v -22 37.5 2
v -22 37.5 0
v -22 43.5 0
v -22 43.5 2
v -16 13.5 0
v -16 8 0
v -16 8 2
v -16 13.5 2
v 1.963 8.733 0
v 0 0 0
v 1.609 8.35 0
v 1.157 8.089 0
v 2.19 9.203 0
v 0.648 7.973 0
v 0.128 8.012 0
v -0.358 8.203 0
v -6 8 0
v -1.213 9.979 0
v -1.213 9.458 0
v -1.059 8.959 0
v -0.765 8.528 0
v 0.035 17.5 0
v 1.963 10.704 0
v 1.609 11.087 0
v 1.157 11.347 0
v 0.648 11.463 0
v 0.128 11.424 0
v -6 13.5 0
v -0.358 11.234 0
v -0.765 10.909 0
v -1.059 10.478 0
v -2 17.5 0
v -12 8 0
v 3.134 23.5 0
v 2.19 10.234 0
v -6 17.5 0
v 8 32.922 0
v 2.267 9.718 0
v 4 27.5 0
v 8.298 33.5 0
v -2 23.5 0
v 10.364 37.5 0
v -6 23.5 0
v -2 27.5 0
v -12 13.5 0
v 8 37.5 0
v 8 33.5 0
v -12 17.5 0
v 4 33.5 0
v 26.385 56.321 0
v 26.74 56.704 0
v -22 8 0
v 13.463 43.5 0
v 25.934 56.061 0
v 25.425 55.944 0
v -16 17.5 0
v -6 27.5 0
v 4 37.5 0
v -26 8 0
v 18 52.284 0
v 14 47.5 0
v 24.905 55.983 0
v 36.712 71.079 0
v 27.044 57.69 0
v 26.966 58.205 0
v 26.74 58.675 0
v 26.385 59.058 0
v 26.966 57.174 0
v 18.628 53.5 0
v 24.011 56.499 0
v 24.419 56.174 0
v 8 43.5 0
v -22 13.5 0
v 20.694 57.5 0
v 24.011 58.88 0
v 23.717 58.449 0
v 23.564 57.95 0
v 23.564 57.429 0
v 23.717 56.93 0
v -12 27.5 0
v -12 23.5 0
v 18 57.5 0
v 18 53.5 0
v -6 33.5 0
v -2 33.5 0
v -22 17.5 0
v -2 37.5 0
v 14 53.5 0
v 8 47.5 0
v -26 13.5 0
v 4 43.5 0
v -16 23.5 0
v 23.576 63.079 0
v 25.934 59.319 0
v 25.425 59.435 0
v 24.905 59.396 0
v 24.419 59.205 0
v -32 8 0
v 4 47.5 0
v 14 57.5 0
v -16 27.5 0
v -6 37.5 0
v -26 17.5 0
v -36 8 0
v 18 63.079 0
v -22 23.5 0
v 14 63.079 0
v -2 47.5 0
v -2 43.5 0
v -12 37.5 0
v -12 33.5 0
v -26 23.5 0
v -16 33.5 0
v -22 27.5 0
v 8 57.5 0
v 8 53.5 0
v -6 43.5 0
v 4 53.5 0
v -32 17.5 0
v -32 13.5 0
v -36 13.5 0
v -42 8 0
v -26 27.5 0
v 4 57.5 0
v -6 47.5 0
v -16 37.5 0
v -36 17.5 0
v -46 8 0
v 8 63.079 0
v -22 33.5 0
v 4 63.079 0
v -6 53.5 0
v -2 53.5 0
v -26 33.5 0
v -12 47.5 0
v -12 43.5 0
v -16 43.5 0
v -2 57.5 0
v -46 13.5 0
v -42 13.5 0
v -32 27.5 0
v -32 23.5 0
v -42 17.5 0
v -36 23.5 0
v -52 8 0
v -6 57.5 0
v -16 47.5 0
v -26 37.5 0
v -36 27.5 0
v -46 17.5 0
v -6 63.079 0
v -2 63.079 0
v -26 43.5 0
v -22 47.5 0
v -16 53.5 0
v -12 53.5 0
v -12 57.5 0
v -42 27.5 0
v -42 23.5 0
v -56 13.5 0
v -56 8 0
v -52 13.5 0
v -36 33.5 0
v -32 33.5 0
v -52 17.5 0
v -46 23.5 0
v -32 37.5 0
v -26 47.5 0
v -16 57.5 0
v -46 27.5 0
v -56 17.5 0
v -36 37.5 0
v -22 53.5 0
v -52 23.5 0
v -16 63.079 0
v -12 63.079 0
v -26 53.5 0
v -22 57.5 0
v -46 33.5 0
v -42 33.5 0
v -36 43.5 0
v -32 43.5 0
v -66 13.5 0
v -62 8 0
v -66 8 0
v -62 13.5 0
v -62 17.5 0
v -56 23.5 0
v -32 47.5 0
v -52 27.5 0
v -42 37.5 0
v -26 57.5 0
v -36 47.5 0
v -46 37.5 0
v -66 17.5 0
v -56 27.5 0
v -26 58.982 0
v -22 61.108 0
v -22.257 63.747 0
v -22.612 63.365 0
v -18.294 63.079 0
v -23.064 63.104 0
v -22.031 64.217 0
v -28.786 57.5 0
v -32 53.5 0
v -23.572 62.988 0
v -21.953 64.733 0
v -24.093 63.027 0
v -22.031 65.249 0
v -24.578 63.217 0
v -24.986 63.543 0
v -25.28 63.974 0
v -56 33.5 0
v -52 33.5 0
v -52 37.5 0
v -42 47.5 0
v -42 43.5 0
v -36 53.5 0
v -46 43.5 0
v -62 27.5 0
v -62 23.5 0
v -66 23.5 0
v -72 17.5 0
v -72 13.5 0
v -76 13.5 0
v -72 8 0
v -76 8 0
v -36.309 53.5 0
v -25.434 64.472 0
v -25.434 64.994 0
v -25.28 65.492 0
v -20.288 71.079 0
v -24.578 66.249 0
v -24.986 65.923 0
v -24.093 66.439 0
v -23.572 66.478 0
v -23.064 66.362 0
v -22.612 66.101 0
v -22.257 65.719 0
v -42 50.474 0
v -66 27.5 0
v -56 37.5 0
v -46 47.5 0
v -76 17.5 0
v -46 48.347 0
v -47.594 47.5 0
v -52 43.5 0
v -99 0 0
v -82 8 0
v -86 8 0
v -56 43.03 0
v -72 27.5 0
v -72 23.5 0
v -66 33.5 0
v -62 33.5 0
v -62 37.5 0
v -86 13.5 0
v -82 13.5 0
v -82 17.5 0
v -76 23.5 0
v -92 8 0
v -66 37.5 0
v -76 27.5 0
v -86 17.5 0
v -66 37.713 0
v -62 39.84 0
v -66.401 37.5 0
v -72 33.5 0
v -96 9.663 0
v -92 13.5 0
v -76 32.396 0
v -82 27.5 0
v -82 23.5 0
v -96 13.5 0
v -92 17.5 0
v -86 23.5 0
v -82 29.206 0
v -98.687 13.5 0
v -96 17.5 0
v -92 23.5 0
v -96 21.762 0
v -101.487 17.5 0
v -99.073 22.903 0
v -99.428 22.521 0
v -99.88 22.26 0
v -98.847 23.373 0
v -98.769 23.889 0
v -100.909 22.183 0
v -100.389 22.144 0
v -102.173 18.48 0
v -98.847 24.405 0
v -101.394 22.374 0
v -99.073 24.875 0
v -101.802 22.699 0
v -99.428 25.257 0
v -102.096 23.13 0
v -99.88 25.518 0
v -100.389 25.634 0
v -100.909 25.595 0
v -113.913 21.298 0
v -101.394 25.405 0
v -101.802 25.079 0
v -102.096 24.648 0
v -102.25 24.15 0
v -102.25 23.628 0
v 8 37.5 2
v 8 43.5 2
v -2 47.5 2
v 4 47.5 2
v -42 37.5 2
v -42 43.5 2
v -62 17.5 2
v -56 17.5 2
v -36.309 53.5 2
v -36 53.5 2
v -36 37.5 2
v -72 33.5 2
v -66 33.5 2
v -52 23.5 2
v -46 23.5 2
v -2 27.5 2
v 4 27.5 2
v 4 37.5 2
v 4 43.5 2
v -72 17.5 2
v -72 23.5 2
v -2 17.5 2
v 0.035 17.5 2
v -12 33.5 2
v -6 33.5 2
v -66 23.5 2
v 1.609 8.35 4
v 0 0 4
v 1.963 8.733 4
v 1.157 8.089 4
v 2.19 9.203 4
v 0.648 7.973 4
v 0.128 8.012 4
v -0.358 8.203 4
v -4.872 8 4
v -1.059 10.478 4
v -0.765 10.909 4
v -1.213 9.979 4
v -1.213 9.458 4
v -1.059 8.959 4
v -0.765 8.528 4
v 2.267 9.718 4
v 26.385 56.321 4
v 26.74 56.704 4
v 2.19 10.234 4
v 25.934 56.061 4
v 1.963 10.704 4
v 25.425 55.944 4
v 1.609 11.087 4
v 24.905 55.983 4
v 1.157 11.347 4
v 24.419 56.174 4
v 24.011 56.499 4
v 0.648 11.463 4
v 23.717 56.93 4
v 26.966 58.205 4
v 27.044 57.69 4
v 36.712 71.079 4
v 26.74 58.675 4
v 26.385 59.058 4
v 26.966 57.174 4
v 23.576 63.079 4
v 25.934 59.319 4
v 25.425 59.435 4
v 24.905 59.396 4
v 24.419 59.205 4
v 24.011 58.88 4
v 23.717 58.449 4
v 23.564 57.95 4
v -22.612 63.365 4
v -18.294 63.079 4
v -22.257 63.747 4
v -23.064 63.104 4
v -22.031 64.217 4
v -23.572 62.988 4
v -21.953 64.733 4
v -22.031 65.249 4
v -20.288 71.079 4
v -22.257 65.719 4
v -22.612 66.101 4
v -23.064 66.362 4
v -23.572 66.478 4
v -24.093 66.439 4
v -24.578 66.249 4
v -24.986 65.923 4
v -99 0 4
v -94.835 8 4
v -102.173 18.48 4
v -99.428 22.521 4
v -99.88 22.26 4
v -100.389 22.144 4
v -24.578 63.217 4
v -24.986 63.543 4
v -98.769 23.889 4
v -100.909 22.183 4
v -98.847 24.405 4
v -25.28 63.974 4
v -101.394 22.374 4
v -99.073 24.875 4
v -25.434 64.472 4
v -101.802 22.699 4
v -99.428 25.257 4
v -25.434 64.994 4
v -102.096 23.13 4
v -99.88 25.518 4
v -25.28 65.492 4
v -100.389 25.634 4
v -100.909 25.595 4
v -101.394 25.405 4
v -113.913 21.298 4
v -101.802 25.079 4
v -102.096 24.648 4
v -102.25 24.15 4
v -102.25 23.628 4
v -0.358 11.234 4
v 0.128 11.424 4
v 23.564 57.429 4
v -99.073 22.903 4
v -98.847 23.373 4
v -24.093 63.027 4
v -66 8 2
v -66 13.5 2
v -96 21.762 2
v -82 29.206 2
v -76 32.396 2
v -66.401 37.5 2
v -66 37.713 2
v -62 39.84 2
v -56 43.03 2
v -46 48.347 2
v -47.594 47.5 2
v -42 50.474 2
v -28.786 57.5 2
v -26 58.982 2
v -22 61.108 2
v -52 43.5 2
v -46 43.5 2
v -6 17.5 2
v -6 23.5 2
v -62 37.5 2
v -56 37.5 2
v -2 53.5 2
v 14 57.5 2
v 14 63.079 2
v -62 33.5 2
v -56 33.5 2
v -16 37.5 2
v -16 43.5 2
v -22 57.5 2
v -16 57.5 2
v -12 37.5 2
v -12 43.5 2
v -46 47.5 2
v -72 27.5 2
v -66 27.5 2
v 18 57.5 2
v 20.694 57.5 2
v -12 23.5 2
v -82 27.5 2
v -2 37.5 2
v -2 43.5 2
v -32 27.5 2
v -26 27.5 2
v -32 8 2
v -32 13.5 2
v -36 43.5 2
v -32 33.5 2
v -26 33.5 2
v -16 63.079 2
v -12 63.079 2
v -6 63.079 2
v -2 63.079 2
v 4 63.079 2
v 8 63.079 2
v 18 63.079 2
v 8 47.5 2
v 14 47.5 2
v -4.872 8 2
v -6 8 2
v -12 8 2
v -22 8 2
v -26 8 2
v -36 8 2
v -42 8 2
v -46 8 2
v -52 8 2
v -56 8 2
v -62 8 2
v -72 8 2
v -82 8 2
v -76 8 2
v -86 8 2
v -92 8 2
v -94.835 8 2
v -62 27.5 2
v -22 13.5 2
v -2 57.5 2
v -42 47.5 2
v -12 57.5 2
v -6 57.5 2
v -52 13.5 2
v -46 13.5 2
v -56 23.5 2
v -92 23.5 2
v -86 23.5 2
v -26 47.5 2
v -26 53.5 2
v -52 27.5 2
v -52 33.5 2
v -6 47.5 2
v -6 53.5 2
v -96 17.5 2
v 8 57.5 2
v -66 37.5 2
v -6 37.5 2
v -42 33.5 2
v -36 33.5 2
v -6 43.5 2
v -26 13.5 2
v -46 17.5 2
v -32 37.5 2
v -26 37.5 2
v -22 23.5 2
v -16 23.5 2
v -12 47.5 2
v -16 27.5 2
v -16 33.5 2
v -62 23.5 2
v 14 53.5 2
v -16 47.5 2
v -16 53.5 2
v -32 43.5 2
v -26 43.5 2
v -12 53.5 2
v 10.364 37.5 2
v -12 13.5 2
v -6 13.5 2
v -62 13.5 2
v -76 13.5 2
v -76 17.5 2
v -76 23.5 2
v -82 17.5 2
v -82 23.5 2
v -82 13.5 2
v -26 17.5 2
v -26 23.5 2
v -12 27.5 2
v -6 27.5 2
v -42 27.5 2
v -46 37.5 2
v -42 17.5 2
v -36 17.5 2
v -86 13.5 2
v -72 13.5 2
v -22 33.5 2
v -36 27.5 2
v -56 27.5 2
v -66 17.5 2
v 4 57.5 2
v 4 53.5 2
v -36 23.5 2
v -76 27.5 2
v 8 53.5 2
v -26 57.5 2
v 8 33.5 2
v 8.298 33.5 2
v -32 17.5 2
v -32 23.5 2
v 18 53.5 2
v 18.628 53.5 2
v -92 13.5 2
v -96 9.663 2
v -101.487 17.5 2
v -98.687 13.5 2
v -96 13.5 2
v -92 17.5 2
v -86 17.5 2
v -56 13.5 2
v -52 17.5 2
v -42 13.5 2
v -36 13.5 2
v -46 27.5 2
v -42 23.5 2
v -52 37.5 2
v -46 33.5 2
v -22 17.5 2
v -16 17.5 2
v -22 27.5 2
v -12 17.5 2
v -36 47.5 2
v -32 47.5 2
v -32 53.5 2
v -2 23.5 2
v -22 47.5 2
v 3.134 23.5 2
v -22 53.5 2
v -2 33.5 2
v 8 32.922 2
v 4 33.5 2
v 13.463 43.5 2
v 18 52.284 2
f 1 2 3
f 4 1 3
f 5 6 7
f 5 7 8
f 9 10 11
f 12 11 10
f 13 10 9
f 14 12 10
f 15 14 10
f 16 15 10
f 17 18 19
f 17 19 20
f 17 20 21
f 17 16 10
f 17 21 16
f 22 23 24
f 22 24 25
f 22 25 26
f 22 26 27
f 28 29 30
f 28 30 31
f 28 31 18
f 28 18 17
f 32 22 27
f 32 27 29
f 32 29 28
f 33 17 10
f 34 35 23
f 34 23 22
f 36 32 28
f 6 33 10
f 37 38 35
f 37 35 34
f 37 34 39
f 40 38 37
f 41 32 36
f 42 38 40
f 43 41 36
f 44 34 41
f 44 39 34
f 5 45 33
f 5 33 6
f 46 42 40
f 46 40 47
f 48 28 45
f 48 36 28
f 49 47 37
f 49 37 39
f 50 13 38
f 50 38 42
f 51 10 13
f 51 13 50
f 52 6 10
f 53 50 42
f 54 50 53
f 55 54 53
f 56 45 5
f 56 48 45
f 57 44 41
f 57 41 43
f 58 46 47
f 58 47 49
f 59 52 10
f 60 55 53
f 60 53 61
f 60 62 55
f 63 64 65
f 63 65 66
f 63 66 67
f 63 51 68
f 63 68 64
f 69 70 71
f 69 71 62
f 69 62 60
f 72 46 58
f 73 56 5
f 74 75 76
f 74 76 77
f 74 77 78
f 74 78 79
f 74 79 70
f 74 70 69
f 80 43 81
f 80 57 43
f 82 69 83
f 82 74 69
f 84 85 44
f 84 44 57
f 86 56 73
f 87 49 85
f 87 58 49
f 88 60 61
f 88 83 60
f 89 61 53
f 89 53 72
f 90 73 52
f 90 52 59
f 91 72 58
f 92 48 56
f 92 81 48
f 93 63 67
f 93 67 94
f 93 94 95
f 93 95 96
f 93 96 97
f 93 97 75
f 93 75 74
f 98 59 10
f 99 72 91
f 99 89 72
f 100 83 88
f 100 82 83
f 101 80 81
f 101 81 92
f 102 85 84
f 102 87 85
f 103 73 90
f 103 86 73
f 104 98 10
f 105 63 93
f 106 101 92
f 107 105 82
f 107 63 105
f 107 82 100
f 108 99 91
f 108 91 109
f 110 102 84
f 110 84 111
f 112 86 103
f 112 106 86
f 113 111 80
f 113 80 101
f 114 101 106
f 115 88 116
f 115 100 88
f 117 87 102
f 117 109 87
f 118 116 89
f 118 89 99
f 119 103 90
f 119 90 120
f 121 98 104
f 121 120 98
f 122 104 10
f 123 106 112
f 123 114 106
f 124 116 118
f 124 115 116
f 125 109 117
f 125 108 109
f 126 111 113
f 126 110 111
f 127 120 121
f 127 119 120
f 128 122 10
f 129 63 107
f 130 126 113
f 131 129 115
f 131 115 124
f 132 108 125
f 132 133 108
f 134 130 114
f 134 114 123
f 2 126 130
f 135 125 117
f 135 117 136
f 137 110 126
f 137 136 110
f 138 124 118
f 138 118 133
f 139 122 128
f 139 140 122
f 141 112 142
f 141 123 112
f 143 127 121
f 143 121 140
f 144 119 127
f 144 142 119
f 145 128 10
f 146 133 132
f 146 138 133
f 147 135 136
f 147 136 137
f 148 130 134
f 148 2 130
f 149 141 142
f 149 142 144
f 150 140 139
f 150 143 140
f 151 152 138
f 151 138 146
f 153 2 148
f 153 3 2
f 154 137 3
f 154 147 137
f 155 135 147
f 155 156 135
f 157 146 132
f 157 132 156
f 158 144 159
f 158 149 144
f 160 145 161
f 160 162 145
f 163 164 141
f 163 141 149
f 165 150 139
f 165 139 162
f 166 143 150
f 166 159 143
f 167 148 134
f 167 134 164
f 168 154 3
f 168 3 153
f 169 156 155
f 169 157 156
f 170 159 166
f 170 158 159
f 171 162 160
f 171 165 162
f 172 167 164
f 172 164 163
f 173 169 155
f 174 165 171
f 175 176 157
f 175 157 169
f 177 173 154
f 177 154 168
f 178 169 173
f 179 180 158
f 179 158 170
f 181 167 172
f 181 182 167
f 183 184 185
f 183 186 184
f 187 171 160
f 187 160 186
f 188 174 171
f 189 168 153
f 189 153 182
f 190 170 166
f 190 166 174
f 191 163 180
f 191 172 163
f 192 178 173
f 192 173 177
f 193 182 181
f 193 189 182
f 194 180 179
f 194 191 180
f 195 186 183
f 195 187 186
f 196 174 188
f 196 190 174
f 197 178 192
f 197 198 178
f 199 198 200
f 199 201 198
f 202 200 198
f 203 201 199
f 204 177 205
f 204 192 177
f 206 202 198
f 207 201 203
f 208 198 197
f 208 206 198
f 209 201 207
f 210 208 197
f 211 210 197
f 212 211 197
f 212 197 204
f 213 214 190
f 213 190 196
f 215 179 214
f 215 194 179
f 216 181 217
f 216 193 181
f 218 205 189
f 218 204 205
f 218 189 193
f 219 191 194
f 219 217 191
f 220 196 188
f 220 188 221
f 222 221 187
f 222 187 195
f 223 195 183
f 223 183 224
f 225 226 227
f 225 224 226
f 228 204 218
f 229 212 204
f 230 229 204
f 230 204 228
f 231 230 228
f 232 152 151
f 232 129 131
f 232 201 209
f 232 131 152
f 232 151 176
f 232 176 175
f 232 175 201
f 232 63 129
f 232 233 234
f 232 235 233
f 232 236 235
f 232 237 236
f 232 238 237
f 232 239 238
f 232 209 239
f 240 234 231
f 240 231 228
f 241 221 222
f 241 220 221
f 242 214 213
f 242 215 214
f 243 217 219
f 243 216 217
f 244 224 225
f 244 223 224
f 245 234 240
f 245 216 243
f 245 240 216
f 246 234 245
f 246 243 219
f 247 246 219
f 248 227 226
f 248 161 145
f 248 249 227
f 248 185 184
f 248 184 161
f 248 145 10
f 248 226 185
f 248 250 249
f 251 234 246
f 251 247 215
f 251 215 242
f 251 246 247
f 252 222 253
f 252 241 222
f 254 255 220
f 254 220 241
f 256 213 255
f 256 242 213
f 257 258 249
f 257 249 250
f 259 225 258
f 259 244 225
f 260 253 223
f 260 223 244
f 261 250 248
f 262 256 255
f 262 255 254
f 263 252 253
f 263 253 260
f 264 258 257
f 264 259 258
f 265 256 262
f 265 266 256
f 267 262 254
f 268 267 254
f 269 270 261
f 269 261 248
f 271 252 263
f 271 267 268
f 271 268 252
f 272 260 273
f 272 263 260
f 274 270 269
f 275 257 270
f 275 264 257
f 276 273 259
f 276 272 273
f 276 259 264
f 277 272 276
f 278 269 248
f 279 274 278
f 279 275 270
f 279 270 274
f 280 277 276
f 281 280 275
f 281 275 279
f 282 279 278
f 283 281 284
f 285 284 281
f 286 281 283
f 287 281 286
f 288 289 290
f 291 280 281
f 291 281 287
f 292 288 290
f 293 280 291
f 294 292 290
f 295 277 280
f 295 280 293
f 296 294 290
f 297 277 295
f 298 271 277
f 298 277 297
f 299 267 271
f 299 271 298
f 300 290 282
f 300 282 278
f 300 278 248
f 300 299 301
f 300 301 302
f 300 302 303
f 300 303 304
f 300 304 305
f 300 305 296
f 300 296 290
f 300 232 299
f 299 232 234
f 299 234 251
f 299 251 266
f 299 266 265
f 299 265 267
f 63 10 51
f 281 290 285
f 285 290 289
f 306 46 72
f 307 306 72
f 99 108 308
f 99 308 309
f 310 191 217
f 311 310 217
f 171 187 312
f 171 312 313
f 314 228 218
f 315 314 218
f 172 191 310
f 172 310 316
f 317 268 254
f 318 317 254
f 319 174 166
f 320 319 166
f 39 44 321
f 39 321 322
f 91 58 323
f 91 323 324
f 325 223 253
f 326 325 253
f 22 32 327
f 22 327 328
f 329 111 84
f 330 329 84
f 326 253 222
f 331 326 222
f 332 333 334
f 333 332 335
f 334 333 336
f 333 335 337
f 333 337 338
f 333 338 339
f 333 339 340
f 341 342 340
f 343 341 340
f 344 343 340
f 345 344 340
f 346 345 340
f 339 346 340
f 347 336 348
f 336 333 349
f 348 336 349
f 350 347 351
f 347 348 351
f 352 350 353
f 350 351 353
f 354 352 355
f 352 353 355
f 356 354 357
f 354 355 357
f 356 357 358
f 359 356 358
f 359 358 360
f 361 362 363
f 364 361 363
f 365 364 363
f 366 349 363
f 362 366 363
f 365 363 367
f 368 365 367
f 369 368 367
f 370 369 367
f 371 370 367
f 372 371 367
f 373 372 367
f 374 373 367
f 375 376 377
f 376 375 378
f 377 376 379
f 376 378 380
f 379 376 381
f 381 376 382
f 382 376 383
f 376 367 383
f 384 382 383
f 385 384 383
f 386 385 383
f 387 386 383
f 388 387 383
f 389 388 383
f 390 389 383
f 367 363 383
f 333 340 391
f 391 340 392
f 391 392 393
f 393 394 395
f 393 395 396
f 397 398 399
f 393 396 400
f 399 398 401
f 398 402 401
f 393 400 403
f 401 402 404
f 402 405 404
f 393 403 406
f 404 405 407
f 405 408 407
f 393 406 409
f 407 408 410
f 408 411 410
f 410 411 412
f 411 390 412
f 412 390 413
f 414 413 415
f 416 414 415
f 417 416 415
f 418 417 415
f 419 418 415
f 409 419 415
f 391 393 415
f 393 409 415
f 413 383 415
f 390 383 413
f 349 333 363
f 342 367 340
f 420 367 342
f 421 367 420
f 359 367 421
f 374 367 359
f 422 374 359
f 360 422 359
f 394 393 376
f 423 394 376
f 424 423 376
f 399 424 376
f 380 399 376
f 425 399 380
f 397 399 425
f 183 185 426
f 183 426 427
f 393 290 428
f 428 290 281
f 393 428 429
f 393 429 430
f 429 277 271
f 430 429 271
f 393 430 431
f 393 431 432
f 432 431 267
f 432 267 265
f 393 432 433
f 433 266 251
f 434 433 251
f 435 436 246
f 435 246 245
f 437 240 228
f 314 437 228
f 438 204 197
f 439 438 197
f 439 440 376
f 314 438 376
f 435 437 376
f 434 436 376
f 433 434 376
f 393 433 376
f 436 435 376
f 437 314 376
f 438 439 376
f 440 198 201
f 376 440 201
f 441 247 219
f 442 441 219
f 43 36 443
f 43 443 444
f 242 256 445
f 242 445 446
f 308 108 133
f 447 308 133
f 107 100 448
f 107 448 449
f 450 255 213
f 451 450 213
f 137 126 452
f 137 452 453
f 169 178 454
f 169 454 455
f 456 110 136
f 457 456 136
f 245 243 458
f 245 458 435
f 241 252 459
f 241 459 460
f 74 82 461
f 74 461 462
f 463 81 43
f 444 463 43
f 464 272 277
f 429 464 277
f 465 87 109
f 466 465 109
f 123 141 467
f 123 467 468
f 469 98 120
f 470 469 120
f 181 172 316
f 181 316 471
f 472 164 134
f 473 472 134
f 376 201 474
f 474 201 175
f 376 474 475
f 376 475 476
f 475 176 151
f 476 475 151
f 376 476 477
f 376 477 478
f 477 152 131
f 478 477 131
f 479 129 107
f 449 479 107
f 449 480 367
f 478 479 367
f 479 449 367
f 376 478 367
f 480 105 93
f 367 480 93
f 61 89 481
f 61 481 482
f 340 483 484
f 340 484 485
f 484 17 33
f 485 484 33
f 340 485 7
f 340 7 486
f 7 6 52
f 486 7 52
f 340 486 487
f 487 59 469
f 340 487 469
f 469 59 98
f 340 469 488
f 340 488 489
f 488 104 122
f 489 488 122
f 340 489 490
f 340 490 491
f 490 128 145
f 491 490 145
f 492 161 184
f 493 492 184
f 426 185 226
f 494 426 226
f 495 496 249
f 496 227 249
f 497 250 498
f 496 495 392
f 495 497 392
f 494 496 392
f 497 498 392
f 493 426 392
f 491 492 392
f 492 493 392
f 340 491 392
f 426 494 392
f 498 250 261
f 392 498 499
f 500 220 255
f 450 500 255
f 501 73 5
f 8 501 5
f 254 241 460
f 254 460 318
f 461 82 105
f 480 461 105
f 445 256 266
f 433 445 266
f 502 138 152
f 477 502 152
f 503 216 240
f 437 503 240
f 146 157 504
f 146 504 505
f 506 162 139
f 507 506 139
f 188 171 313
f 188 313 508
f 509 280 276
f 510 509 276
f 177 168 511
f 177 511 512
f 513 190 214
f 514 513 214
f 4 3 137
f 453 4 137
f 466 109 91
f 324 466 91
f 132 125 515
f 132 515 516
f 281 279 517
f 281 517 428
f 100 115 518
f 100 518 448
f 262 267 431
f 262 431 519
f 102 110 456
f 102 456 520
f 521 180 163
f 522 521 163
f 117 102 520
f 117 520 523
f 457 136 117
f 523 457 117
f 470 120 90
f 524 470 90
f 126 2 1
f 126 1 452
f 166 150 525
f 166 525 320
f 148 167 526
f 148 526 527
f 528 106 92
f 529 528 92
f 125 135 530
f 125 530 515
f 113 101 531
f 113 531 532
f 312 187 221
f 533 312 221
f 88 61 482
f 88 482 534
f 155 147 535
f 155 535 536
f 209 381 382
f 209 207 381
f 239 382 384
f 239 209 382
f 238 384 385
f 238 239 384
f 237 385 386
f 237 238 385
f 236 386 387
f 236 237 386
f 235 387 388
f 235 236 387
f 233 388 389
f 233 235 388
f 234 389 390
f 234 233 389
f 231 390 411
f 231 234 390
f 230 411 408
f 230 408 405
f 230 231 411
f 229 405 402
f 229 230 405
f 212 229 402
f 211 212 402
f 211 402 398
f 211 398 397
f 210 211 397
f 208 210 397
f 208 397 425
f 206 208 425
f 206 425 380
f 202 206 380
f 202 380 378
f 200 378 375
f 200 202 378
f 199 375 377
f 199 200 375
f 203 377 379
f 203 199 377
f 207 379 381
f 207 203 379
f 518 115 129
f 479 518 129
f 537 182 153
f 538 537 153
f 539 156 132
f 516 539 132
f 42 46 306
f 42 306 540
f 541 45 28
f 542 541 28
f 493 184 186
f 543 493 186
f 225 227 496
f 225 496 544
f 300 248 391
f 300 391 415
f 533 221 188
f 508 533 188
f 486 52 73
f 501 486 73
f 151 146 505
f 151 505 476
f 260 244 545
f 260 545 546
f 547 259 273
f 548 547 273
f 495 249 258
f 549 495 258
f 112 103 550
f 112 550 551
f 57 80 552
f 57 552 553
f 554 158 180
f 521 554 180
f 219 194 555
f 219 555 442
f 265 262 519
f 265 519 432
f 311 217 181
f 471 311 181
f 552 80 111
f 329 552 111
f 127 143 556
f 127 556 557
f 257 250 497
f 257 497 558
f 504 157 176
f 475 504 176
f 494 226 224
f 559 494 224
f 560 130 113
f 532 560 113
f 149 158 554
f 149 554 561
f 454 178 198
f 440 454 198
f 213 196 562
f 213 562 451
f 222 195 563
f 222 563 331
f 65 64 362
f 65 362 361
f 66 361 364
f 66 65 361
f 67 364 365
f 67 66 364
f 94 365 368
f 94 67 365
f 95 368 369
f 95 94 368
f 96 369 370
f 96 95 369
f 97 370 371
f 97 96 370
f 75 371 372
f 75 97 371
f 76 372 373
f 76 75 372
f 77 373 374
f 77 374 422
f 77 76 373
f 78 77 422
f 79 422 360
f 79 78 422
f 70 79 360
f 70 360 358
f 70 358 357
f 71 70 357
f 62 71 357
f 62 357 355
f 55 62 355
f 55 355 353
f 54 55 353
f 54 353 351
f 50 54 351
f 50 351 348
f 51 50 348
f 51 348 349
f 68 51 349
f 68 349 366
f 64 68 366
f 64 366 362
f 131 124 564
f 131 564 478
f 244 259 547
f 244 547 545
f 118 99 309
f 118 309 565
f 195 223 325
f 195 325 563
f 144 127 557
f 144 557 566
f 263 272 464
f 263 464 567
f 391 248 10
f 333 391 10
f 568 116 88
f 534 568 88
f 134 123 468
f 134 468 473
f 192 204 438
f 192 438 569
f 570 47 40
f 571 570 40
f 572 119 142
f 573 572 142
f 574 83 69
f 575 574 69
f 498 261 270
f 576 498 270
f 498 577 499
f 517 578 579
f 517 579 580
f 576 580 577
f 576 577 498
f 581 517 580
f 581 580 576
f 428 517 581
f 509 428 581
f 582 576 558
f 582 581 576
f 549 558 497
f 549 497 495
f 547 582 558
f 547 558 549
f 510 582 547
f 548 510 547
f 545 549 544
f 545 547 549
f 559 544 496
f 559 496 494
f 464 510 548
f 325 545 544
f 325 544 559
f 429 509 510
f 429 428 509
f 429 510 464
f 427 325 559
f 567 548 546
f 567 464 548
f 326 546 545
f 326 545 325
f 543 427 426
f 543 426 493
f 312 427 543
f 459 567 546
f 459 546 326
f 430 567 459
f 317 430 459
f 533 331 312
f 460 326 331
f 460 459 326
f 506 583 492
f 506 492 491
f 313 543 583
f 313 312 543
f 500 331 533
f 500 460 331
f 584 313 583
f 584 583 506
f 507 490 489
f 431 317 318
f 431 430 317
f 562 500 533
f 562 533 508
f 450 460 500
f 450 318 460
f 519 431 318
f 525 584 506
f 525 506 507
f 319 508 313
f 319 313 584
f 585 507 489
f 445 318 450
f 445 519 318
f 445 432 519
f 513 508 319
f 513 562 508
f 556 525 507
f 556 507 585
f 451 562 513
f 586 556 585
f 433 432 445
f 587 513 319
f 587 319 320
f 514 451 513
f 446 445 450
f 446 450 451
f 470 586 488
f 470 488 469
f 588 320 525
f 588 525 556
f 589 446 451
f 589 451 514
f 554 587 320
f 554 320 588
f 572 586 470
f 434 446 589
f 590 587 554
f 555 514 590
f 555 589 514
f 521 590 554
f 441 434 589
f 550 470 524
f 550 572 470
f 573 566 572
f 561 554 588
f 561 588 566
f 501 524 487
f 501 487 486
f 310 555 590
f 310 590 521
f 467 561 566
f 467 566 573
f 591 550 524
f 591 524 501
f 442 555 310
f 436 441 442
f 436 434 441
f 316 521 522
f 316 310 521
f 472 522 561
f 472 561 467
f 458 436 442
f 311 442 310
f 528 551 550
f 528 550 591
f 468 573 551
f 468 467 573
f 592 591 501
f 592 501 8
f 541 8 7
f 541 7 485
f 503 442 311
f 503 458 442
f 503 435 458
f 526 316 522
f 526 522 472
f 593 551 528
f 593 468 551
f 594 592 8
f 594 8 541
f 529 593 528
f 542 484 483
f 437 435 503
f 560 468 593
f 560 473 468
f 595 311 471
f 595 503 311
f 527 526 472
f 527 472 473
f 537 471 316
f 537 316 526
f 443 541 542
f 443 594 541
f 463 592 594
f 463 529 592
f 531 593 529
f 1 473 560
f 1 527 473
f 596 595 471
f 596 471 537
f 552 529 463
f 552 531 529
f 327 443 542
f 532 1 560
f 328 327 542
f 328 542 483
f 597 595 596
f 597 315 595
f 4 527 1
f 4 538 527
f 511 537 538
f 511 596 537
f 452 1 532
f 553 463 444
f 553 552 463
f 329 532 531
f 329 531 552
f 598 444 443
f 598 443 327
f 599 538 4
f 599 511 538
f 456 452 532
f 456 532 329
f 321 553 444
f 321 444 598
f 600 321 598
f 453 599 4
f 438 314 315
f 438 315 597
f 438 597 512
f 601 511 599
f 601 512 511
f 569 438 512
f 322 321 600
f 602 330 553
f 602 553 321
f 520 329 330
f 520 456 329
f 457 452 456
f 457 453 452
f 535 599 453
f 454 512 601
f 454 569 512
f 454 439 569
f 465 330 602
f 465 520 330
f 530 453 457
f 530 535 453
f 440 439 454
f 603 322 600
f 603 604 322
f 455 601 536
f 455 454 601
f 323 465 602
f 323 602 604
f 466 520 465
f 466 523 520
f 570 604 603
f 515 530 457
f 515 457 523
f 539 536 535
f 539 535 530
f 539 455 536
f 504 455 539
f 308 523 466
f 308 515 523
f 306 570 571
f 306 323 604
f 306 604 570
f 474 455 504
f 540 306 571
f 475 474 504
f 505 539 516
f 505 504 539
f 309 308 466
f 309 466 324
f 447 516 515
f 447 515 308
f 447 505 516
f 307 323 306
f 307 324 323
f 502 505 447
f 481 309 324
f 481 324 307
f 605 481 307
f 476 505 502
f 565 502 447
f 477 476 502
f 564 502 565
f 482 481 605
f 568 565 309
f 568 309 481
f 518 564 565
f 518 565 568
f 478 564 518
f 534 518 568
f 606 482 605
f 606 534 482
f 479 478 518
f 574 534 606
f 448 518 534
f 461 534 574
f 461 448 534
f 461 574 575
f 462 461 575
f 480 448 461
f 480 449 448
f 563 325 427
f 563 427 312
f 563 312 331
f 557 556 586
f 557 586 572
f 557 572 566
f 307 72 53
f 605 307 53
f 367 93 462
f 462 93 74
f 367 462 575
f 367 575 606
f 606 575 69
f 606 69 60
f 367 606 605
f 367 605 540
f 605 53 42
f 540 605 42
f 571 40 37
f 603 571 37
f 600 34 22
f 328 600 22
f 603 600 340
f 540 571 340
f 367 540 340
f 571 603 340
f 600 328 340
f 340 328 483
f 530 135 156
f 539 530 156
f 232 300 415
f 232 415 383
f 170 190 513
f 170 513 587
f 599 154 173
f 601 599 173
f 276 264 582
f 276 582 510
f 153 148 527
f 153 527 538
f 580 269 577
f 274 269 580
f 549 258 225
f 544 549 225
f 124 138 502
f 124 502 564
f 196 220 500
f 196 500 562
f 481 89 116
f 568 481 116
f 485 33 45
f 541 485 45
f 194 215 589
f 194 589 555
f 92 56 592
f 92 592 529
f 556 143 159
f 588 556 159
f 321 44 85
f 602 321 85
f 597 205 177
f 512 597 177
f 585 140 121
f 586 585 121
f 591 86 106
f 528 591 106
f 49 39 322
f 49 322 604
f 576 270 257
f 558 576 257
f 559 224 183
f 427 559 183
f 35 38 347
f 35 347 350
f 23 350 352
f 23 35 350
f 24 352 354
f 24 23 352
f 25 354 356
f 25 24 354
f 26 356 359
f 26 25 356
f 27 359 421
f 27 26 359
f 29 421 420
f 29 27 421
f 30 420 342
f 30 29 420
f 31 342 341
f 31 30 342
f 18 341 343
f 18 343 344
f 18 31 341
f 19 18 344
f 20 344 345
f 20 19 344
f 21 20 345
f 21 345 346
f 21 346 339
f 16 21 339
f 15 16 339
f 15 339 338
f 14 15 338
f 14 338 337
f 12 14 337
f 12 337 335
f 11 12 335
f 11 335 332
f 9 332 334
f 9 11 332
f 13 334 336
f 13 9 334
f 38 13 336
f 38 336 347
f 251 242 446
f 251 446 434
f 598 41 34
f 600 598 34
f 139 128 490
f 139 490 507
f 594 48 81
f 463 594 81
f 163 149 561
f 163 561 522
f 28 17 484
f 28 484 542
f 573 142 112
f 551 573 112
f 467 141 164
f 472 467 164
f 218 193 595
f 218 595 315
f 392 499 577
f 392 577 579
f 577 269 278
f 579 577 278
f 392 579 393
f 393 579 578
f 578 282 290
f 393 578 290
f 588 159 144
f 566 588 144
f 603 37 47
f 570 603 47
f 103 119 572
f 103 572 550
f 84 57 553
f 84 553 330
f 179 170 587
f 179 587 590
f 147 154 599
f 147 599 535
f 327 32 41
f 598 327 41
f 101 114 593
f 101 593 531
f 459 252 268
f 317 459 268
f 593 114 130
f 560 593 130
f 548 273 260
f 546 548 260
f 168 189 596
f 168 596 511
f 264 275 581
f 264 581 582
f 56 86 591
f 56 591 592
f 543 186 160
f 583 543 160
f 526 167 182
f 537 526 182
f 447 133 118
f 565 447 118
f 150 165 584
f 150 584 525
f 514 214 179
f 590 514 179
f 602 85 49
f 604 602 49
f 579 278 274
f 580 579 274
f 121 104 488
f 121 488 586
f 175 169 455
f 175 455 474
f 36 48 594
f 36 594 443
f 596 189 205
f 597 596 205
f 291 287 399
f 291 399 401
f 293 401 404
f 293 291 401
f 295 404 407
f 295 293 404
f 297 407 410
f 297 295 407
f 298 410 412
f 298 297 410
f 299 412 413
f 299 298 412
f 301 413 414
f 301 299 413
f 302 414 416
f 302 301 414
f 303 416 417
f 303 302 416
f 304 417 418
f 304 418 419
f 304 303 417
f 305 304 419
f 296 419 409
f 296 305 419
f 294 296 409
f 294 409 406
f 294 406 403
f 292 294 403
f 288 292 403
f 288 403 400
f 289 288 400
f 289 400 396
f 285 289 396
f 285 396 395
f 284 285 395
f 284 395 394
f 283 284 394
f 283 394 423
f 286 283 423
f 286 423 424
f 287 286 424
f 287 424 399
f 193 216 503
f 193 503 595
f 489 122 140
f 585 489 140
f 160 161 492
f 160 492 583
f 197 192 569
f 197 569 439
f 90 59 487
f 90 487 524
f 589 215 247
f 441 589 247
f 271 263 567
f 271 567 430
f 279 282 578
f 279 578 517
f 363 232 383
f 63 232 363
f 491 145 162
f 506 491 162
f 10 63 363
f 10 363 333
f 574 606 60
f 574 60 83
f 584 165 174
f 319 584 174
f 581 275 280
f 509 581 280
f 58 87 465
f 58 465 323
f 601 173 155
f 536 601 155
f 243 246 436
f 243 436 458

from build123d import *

# Parameters (mm, degrees)
SKETCH002_R      = 1.75
PAD005_DEPTH     = 25
SKETCH004_R      = 1.75
PAD004_DEPTH     = 4
PAD003_DEPTH     = 10
BOX001_W         = 157
BOX001_H         = 4
BOX001_DEPTH     = 2
ARRAY001_Y_COUNT = 7
ARRAY001_Y_PITCH = 10
BOX_W            = 4
BOX_H            = 71
BOX_DEPTH        = 2
ARRAY_X_COUNT    = 14
ARRAY_X_PITCH    = 10


with BuildPart() as pad005:
    # Sketch002 → Pad005 (new body)
    with BuildSketch(Plane.XY.offset(-5)):
        with Locations((-100.519385, 23.889178)):
            Circle(SKETCH002_R)
        with Locations((-23.703251, 64.733041)):
            Circle(SKETCH002_R)
        with Locations((25.294184, 57.68959)):
            Circle(SKETCH002_R)
        with Locations((0.517434, 9.718367)):
            Circle(SKETCH002_R)
    extrude(amount=PAD005_DEPTH)


with BuildPart() as pad004:
    # Sketch004 → Pad004 (new body)
    with BuildSketch(Plane.XY):
        Polygon((-113.912987, 21.297953), (-20.288199, 71.079136), (36.711801, 71.079136), (0, 0), (-22, 0), (-61, 0), (-99, 0), align=None)
        with Locations((-100.519385, 23.889178)):
            Circle(SKETCH004_R, mode=Mode.SUBTRACT)
        with Locations((-23.703251, 64.733041)):
            Circle(SKETCH004_R, mode=Mode.SUBTRACT)
        with Locations((25.294184, 57.68959)):
            Circle(SKETCH004_R, mode=Mode.SUBTRACT)
        with Locations((0.517434, 9.718367)):
            Circle(SKETCH004_R, mode=Mode.SUBTRACT)
        Polygon((-61, 8), (-94.835464, 8), (-102.173289, 18.479501), (-18.293574, 63.079136), (23.575817, 63.079136), (-4.872113, 8), (-22, 8), align=None, mode=Mode.SUBTRACT)
    extrude(amount=PAD004_DEPTH)


with BuildPart() as pad003:
    # Sketch003 → Pad003 (new body)
    with BuildSketch(Plane.XY.offset(-1)):
        Polygon((-113.912987, 21.297953), (-20.288199, 71.079136), (36.711801, 71.079136), (0, 0), (-22, 0), (-61, 0), (-99, 0), align=None)
    extrude(amount=PAD003_DEPTH)


with BuildPart() as array001:
    # Box001 → Box001 (new body)
    with BuildSketch(Plane(origin=(-115, 0, 0), x_dir=(1, 0, 0), z_dir=(0, 0, 1))):
        with Locations((78.5, 2)):
            Rectangle(BOX001_W, BOX001_H)
    extrude(amount=BOX001_DEPTH)

    # Array001 Y: Array001 ×7


with BuildPart() as array001_1:
    add(array001.part)
    with Locations(*[(0, i * ARRAY001_Y_PITCH, 0) for i in range(1, ARRAY001_Y_COUNT)]):
        add(array001.part)


with BuildPart() as array001_2:
    # Array001 placement: moved
    add(array001_1.part.moved(Location((0, 3.5, 0))))


with BuildPart() as cut002:
    # Box → Box (new body)
    with BuildSketch(Plane.XY):
        with Locations((2, 35.5)):
            Rectangle(BOX_W, BOX_H)
    extrude(amount=BOX_DEPTH)

    # Array X: Cut002 ×14


with BuildPart() as cut002_1:
    add(cut002.part)
    with Locations(*[(i * ARRAY_X_PITCH, 0, 0) for i in range(1, ARRAY_X_COUNT)]):
        add(cut002.part)


with BuildPart() as cut002_2:
    # Array placement: moved
    add(cut002_1.part.moved(Location((-96, 0, 0))))

    # Fusion002: union Array001
    add(array001_2.part)

    # Common001: intersect Pad003
    add(pad003.part, mode=Mode.INTERSECT)

    # Fusion003: union Pad004
    add(pad004.part)

    # Cut002: cut Pad005
    add(pad005.part, mode=Mode.SUBTRACT)


solid = cut002_2.part
